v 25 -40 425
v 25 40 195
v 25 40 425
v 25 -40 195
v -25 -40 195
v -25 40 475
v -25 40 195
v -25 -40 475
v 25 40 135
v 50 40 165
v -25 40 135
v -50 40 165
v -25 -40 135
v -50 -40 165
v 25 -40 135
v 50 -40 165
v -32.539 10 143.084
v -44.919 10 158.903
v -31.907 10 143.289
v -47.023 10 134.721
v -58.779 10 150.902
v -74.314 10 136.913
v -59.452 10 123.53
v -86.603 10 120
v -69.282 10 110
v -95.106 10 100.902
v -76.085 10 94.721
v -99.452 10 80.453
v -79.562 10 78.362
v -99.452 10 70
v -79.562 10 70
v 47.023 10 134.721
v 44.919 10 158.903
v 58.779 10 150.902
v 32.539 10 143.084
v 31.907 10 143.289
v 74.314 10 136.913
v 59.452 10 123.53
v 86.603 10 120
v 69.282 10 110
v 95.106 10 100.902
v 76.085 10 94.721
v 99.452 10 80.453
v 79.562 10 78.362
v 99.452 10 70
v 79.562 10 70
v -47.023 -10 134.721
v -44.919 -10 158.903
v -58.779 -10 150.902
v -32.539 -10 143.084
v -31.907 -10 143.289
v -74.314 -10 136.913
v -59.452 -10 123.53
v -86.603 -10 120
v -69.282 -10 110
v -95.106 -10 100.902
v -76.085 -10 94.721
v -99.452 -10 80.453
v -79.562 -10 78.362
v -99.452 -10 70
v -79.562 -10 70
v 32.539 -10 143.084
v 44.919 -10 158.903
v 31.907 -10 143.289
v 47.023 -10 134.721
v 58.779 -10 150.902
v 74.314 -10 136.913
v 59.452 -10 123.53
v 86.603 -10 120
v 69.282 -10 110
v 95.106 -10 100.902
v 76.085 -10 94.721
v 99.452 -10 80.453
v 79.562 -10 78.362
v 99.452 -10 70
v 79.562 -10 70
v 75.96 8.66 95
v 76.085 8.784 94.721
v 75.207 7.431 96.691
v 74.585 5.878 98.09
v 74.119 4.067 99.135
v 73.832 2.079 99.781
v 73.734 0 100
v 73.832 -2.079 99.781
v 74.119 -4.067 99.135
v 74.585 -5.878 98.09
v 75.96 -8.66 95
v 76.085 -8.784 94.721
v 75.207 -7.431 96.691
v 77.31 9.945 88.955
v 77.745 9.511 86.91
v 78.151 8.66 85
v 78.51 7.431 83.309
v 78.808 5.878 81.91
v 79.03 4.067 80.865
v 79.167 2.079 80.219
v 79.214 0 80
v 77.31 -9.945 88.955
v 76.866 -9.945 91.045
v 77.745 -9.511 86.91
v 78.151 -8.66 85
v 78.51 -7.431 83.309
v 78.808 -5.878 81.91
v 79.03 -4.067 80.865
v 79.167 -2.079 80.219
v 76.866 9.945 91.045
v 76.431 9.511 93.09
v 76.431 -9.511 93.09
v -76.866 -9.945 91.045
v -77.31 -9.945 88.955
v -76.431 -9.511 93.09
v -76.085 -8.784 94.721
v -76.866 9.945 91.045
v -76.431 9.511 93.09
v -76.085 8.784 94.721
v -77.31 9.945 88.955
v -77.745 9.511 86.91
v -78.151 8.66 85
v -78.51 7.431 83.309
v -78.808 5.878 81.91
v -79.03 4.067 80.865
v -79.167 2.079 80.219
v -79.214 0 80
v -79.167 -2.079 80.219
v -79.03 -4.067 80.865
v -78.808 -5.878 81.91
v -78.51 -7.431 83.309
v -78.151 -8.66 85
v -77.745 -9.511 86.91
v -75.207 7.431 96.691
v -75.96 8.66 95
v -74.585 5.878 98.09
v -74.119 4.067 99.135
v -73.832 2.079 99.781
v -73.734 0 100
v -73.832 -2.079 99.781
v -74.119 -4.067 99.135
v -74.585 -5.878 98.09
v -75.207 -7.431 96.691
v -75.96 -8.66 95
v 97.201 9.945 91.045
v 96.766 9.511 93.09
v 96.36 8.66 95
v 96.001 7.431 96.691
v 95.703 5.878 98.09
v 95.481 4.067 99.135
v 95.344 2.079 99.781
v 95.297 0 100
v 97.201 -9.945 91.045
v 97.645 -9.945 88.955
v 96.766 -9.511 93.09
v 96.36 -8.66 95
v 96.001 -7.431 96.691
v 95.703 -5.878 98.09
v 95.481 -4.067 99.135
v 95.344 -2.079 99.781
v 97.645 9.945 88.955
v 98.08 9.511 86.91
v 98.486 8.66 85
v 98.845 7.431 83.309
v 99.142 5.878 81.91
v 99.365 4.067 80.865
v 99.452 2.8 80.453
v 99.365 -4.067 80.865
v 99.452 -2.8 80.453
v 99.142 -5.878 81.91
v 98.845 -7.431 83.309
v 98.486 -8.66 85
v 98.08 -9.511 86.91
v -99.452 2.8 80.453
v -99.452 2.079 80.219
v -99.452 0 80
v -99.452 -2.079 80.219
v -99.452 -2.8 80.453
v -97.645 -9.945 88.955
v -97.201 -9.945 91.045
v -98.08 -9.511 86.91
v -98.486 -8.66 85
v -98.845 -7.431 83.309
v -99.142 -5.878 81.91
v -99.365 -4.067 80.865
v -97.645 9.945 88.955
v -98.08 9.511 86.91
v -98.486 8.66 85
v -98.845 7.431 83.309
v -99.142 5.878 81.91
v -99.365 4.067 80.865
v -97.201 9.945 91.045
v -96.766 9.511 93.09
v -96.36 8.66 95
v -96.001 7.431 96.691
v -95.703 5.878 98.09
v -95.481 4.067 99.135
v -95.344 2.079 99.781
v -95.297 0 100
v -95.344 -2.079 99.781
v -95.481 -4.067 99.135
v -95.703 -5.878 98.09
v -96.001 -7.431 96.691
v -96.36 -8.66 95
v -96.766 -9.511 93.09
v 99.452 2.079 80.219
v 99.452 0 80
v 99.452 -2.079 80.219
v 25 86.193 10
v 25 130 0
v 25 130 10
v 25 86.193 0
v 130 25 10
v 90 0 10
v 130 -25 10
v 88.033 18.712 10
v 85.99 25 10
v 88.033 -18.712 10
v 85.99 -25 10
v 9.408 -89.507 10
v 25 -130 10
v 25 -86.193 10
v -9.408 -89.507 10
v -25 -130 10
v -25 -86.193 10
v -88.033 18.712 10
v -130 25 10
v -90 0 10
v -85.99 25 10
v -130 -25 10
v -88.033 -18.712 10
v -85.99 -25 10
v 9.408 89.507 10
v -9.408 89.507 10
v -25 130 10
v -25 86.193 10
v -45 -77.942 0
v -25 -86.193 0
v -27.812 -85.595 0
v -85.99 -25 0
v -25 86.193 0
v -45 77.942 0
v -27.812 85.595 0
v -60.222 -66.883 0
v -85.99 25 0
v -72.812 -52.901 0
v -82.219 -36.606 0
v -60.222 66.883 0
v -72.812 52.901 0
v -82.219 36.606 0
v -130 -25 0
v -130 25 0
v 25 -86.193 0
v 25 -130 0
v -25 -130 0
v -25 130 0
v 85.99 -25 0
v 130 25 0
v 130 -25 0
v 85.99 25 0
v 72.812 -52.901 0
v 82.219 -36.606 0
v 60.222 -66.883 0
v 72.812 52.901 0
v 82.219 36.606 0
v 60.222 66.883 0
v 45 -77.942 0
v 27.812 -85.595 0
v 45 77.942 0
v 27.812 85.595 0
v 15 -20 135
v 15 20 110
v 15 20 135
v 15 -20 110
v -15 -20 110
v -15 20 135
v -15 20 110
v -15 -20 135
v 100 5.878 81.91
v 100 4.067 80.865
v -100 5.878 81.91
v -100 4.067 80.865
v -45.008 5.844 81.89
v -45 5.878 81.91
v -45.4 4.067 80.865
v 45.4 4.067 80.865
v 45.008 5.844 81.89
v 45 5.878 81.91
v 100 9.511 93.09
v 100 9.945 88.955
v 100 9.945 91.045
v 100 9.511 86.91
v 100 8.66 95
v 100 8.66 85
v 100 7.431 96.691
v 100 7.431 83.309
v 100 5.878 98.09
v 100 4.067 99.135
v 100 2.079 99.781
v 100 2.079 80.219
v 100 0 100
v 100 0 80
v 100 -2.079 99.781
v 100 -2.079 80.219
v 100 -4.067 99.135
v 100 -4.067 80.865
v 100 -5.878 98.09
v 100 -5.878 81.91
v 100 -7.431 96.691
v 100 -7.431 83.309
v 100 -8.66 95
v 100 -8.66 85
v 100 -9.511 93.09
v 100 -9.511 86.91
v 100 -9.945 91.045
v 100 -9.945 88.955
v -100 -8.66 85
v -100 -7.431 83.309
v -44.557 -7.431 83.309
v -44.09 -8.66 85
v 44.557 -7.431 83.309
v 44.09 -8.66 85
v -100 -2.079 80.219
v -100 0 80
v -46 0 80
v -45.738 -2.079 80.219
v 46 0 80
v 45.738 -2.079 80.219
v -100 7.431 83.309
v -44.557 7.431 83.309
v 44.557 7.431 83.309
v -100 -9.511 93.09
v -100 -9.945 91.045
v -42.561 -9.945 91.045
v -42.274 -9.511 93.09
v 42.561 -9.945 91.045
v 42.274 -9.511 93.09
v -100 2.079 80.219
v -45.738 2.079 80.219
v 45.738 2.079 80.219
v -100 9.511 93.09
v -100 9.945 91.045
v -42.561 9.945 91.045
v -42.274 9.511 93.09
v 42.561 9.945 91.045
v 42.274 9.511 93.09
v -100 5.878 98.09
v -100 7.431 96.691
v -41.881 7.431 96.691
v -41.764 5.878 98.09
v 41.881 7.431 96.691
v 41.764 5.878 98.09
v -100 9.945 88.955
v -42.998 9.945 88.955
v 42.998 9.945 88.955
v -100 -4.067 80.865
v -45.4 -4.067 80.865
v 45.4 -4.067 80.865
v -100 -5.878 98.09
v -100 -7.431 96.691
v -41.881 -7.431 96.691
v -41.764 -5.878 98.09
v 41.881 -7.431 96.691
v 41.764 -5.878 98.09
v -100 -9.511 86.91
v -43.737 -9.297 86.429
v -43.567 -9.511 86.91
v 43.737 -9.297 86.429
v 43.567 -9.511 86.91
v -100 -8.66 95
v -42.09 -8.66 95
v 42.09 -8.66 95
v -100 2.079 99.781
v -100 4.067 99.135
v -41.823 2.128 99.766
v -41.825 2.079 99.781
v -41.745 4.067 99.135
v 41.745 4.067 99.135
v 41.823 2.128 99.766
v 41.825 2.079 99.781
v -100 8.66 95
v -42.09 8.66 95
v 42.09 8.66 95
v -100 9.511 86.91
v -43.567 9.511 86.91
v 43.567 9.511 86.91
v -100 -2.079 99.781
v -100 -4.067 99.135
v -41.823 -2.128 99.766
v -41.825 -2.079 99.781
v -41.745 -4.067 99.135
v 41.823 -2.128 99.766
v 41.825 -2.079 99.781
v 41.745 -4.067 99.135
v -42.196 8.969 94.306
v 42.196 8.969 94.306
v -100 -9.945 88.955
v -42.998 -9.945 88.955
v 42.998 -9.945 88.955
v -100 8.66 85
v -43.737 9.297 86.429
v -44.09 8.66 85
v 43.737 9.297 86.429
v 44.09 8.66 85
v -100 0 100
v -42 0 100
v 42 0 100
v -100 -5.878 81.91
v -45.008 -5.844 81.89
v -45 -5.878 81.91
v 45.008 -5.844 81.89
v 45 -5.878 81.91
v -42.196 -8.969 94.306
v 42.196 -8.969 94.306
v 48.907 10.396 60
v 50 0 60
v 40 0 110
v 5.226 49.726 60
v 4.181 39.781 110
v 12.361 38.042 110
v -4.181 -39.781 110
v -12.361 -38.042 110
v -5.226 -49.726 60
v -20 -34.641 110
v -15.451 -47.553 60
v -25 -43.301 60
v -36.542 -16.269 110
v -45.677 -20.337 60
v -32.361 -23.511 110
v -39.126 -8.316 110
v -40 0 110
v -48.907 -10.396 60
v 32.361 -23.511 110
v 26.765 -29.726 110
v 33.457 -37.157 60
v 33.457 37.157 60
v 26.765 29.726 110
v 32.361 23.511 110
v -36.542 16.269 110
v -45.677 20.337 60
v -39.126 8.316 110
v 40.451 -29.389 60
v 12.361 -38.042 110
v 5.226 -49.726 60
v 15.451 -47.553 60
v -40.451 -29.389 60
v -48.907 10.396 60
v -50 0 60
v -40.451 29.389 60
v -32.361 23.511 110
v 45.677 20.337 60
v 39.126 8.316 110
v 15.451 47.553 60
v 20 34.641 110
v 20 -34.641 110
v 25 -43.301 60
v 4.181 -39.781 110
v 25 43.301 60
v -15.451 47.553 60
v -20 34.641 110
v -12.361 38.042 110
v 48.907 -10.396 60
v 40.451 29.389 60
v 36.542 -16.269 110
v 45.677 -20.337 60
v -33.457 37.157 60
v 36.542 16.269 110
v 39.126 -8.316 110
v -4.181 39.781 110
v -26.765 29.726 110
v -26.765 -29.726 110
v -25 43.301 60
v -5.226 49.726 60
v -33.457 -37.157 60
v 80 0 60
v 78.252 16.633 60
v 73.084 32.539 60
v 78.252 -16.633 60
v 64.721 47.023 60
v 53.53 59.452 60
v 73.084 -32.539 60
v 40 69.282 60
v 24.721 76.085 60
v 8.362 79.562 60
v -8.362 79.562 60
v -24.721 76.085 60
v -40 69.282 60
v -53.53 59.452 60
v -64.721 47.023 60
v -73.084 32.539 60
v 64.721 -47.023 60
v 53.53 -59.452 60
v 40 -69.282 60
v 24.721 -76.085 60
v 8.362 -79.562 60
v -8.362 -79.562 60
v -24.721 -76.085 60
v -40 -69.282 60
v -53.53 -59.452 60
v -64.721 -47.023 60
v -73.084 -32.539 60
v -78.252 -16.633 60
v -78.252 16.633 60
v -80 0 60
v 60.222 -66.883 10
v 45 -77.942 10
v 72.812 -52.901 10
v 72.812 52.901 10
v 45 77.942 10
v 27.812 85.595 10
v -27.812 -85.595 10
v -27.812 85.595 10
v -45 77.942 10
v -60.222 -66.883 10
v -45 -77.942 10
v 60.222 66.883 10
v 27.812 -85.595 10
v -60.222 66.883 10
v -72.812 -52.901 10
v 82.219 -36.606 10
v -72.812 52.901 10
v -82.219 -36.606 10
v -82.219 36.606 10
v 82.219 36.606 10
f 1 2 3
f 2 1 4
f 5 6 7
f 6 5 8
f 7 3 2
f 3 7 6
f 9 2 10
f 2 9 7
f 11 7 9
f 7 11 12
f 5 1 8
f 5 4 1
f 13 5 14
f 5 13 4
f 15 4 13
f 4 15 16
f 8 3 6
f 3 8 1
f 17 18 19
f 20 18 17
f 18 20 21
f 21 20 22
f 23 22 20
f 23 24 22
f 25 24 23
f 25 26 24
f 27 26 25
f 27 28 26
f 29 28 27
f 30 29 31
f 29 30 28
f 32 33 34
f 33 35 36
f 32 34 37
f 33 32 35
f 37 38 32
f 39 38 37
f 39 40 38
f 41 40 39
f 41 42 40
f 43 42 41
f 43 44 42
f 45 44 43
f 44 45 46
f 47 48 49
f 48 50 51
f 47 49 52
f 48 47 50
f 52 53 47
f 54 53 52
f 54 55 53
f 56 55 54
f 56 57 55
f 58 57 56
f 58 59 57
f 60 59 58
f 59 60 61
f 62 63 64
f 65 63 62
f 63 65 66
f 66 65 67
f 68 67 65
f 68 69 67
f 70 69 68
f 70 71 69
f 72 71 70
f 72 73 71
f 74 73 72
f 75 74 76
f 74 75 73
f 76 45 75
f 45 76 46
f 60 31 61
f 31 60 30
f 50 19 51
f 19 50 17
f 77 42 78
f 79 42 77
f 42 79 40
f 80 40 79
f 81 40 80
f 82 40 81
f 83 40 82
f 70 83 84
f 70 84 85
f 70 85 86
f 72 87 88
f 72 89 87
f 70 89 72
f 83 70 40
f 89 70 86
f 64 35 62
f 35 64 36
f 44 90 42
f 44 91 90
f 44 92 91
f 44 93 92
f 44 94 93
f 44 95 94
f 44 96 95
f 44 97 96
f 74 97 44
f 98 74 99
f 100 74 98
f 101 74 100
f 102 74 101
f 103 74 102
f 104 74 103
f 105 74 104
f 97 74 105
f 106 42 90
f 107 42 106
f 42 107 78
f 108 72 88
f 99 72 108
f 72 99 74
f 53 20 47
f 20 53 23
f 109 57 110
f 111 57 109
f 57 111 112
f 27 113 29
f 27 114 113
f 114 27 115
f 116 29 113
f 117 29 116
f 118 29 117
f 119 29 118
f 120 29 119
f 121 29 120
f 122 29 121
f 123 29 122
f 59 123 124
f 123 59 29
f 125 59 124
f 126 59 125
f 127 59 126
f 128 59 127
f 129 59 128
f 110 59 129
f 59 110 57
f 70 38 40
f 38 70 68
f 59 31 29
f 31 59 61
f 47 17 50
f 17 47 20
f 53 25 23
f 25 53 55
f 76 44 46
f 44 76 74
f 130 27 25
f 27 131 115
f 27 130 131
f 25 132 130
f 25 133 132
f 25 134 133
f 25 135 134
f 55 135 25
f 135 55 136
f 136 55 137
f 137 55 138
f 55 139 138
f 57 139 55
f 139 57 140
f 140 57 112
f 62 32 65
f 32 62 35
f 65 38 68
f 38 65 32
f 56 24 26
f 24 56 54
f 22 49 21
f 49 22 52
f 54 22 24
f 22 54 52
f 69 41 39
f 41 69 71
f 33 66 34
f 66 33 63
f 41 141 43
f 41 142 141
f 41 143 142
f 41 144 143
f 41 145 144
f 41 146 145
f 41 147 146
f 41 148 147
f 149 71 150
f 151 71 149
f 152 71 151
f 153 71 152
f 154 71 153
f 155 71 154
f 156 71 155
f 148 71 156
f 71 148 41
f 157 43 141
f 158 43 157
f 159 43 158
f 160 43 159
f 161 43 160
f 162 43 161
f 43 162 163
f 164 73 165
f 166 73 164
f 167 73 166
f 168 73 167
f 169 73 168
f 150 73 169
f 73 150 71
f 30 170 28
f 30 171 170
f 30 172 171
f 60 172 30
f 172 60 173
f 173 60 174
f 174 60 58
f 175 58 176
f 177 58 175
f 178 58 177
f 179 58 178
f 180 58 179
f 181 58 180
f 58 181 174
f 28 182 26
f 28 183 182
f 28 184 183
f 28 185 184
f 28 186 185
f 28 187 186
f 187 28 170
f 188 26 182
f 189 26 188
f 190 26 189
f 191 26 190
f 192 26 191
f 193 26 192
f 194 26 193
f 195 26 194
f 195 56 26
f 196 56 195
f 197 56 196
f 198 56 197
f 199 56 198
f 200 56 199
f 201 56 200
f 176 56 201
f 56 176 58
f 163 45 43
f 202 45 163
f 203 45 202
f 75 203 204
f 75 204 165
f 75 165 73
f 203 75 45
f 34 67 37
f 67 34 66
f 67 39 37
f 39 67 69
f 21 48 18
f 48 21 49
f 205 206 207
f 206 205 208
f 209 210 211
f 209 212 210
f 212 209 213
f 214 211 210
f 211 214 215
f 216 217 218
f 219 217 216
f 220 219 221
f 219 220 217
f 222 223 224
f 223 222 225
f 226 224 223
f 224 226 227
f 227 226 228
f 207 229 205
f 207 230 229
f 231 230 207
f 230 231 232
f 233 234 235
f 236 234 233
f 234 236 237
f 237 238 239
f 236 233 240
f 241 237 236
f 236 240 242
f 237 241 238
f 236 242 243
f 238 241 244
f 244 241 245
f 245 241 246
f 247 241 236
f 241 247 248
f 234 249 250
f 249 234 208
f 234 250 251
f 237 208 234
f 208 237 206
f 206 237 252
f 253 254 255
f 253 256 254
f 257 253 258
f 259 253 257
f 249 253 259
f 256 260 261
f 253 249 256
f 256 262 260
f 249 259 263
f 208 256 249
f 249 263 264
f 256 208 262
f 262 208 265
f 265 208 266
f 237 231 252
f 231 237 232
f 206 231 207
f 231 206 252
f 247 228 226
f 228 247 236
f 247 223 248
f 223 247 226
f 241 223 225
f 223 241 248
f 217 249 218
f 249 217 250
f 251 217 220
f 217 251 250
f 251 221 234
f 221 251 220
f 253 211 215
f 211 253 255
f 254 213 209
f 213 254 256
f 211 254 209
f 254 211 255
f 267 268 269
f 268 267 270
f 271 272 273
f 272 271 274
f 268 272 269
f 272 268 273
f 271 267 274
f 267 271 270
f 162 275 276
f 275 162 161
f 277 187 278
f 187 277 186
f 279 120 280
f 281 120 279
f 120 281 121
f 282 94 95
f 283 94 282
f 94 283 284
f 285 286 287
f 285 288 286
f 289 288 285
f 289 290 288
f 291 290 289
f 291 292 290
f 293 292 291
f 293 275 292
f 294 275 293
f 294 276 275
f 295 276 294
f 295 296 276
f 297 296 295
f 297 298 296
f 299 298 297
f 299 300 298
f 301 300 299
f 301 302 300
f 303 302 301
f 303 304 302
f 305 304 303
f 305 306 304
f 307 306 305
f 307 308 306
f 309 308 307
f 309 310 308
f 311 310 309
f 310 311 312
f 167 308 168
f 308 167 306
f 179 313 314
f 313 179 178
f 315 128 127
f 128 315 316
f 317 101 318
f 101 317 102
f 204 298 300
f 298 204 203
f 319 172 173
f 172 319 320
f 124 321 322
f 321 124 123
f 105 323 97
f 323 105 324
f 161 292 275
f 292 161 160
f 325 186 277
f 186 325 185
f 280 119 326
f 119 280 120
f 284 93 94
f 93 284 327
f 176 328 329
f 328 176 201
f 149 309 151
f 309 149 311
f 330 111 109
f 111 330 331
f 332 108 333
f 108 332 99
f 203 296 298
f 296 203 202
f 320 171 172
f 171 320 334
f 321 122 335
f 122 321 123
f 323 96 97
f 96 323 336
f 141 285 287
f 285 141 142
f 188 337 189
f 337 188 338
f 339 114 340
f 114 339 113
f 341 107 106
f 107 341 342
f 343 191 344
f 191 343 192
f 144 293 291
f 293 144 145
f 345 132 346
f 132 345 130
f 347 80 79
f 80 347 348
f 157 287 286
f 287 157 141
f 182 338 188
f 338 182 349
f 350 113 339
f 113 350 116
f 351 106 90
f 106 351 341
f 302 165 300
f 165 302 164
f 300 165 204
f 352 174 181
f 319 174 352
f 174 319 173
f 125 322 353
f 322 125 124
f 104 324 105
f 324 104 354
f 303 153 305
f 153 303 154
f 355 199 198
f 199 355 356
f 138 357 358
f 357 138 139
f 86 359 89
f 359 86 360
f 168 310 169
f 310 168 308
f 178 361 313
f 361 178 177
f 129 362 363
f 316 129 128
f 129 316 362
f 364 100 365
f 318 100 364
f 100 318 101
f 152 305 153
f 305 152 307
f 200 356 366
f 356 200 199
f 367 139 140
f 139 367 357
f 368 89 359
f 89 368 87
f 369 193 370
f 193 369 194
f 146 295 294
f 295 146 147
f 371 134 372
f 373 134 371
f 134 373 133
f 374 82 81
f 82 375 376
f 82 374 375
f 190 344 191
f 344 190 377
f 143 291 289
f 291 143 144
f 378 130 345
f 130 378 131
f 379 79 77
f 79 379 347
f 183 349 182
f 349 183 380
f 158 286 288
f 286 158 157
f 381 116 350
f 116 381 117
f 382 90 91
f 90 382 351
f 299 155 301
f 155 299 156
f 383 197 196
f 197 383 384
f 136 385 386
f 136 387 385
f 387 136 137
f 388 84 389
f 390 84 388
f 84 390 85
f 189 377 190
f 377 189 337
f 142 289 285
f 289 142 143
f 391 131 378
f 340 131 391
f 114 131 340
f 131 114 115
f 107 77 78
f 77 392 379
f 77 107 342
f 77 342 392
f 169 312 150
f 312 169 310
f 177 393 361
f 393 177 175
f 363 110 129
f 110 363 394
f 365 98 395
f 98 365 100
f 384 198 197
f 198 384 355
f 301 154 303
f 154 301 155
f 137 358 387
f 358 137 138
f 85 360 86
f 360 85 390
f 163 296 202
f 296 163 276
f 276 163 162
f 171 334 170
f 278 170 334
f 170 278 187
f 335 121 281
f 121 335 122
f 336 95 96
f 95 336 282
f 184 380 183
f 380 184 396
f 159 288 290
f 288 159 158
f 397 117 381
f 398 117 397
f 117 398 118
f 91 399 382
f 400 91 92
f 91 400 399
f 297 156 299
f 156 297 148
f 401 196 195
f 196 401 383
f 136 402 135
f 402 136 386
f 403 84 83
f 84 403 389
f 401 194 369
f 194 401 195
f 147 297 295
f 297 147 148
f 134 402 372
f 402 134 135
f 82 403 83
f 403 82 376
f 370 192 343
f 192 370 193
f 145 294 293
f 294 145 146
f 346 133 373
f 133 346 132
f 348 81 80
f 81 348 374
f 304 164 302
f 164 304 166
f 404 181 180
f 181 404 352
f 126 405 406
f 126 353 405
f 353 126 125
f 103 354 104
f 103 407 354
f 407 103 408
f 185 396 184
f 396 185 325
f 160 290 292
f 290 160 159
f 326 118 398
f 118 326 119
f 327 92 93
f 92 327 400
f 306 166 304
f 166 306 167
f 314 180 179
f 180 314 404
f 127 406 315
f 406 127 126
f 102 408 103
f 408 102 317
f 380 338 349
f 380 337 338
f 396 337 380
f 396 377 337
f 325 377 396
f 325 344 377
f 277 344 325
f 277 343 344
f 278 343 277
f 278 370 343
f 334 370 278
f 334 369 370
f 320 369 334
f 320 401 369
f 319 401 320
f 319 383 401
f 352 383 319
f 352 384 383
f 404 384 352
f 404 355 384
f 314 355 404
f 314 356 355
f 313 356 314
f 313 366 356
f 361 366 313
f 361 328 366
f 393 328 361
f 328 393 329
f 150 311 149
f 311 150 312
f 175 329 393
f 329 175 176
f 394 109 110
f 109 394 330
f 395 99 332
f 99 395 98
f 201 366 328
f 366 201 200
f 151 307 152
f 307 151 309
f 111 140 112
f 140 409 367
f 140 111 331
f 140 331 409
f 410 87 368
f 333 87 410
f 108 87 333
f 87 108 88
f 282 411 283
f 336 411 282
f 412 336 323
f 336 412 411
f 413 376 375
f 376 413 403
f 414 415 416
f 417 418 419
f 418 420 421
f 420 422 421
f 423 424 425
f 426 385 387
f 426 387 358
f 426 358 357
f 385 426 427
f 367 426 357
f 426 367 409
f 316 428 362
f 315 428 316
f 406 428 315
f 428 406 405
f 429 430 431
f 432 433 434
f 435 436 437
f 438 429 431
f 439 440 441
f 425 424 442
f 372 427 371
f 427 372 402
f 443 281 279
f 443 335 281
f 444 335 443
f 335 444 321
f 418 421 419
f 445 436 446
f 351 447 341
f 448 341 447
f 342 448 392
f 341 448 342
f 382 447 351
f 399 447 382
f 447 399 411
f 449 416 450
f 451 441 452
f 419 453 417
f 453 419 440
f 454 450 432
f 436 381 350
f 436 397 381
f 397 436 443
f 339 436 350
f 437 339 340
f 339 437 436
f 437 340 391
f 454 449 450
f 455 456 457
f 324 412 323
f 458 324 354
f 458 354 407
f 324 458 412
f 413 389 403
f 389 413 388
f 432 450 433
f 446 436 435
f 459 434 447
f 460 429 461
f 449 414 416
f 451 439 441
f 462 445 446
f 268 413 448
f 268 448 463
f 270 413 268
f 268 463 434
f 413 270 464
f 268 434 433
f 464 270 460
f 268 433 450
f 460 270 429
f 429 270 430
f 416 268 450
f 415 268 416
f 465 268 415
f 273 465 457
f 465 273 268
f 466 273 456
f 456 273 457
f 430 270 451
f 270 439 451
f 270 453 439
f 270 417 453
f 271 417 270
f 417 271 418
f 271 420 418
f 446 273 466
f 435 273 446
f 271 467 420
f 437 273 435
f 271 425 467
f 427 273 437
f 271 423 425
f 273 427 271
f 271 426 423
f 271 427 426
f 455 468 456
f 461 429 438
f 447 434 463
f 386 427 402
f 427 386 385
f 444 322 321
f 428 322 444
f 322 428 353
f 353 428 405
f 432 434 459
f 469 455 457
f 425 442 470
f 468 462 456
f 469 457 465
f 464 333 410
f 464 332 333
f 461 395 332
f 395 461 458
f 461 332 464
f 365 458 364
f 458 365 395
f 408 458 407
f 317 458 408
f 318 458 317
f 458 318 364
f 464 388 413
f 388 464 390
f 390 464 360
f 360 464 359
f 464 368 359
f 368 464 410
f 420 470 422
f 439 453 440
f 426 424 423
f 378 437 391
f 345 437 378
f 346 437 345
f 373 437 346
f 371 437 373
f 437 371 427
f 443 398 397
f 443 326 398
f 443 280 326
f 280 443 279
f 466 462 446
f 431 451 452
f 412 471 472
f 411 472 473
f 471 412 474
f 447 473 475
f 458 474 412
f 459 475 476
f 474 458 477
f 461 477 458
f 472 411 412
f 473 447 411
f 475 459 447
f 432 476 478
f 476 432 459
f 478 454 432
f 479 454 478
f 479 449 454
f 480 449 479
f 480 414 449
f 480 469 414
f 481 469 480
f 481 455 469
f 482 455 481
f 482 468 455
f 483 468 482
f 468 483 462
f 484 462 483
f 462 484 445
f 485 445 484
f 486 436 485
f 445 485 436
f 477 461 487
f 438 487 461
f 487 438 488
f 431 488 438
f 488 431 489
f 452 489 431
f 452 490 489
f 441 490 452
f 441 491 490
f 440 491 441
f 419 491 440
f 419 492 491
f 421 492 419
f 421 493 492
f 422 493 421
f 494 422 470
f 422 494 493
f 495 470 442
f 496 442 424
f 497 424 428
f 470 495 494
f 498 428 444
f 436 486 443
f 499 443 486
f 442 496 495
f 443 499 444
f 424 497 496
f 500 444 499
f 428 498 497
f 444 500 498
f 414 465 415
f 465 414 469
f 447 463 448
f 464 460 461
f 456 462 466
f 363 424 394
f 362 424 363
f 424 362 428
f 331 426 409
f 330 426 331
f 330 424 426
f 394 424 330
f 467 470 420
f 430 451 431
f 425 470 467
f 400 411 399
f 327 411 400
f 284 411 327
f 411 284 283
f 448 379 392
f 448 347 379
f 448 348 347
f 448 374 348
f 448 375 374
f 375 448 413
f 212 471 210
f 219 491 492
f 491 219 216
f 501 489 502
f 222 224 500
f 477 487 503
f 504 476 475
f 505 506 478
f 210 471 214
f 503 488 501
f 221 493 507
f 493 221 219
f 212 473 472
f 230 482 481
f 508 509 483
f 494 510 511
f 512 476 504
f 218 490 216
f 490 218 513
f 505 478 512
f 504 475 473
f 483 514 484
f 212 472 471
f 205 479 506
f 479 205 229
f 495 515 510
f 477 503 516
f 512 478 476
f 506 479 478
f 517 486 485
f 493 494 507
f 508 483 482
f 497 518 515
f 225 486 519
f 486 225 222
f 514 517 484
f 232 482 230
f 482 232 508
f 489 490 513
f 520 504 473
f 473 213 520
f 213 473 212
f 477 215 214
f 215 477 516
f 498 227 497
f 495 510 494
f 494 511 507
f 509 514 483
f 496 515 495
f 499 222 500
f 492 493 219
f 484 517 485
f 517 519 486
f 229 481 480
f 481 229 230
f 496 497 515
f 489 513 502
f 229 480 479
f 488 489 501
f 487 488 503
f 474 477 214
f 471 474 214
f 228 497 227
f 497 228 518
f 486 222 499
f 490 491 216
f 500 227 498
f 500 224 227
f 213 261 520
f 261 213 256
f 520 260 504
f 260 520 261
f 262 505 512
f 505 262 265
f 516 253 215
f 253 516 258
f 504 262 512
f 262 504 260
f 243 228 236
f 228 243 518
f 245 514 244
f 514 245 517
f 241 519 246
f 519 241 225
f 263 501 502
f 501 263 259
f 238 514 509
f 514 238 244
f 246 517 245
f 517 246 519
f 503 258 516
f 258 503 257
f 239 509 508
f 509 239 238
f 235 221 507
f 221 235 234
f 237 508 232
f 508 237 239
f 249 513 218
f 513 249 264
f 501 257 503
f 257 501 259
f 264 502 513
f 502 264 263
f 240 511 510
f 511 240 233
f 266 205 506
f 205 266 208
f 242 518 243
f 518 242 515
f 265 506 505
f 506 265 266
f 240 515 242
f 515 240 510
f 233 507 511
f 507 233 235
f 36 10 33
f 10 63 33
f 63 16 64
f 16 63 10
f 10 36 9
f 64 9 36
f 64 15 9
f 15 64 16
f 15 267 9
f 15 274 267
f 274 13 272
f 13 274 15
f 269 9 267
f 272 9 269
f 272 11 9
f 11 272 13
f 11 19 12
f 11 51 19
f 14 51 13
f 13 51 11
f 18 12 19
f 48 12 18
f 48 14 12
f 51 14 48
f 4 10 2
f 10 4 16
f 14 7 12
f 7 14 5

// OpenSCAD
translate([-15,-20,0])
cube([30,40,300],false);

translate([-100,0,90])
rotate([0,90,0])
cylinder(200,10,10);

group(){
    difference(){
        translate([-25,-40,195])
        cube([50,80,300],false);
    
        translate([-40,-40,490])
        rotate([0,45,0])
        cube([100,160,50],false);    
    }
}


translate([0,-10,0])
rotate([0,0,90])
group(){
    rotate([0,90,0])
    translate([-70,0,0])
    difference(){
        cylinder(20,100,100);
        group(){
            translate([0,-100,0])
            cube([100,200,20],false);
            cylinder(20,80,80);
        }
    
    }
}
translate([0,0,60])
cylinder(50,50,40);

translate([0,0,10])
cylinder(50,90,80);

cylinder(10,90,90);

for(k =  [0 : 1 : 3]){
    rotate([0,0,90*k])
    translate([-25,80,0])    
    cube([50,50,10],false);
}
B = 100; //-- Base larga
b = 50; //-- Base corta
h = 60; //-- Altura
translate([0,0,150])
rotate([90, 180, 0]) 
linear_extrude(height = 80, center = true) 
polygon(points = [
                  [-B/2, -h/2],
                  [-b/2, h/2],
                  [b/2, h/2],
                  [B/2, -h/2]
                 ]);

B = 100; //-- Base larga
b = 50; //-- Base corta
h = 30; //-- Altura
translate([0,0,180])
rotate([90, 0, 0]) 
linear_extrude(height = 80, center = true) 
polygon(points = [
                  [-B/2, -h/2],
                  [-b/2, h/2],
                  [b/2, h/2],
                  [B/2, -h/2]
                 ]);
